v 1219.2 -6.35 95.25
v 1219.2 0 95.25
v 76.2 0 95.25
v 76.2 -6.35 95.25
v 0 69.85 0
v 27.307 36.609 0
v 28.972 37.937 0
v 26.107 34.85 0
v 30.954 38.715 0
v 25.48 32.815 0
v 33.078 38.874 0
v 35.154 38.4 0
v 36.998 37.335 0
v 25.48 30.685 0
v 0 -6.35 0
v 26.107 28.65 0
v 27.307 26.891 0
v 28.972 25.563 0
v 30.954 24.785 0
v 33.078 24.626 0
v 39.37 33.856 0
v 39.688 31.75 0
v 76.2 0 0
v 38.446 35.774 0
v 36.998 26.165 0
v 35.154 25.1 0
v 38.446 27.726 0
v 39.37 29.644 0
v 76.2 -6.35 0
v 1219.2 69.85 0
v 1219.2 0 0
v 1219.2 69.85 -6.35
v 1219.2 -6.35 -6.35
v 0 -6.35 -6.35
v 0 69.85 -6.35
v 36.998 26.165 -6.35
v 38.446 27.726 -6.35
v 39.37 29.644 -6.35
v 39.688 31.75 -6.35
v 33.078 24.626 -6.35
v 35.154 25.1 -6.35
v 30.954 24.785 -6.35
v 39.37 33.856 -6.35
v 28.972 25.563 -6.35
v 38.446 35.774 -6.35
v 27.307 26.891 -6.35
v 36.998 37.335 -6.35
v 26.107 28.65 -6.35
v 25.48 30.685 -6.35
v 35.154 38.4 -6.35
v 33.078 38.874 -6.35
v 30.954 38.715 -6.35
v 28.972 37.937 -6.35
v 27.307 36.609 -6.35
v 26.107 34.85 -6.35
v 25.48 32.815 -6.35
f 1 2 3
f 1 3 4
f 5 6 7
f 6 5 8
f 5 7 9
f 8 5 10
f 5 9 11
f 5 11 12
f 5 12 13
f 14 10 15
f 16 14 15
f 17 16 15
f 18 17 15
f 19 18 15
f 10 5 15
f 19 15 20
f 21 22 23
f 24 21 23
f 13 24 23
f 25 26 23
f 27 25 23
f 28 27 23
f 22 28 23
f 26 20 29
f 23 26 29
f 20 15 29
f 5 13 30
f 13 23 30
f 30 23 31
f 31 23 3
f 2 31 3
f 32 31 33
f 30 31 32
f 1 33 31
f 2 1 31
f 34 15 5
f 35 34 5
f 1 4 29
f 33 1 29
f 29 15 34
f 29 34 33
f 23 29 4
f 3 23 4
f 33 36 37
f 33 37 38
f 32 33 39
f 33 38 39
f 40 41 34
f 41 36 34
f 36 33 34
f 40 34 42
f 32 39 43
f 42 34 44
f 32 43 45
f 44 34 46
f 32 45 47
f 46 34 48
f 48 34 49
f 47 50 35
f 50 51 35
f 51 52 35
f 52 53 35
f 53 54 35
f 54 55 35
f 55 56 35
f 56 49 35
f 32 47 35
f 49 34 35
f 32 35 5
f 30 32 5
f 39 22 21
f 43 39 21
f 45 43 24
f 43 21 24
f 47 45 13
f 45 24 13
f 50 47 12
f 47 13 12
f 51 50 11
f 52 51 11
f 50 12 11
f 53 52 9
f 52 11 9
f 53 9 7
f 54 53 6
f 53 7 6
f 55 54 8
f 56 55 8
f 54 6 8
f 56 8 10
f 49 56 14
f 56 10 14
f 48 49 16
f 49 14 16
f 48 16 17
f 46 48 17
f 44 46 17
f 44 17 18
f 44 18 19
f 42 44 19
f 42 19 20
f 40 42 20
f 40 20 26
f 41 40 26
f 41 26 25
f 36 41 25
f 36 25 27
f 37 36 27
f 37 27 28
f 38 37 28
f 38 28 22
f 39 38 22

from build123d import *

# Parameters (mm, degrees)
F1_DEPTH = 1219.2
F2_W     = 76.2
F2_H     = 95.25
F3_DEPTH = 25.4
F4_R     = 7.14375
F5_DEPTH = 25.4


with BuildPart() as f1:
    # F0 (on Right) → F1 (new body)
    with BuildSketch(Plane.YZ):
        Polygon((0, 95.25), (-6.35, 95.25), (-6.35, -6.35), (69.85, -6.35), (69.85, 0), (0, 0), align=None)
    extrude(amount=F1_DEPTH)

    # F2 (on face) → F3 (cut)
    with BuildSketch(Plane.XZ.offset(6.35)):
        with Locations((38.1, 47.625)):
            Rectangle(F2_W, F2_H)
    extrude(amount=-F3_DEPTH, mode=Mode.SUBTRACT)

    # F4 (on face) → F5 (cut)
    with BuildSketch(Plane.XY):
        with Locations((32.54375, 31.75)):
            Circle(F4_R)
    extrude(amount=-F5_DEPTH, mode=Mode.SUBTRACT)


solid = f1.part
